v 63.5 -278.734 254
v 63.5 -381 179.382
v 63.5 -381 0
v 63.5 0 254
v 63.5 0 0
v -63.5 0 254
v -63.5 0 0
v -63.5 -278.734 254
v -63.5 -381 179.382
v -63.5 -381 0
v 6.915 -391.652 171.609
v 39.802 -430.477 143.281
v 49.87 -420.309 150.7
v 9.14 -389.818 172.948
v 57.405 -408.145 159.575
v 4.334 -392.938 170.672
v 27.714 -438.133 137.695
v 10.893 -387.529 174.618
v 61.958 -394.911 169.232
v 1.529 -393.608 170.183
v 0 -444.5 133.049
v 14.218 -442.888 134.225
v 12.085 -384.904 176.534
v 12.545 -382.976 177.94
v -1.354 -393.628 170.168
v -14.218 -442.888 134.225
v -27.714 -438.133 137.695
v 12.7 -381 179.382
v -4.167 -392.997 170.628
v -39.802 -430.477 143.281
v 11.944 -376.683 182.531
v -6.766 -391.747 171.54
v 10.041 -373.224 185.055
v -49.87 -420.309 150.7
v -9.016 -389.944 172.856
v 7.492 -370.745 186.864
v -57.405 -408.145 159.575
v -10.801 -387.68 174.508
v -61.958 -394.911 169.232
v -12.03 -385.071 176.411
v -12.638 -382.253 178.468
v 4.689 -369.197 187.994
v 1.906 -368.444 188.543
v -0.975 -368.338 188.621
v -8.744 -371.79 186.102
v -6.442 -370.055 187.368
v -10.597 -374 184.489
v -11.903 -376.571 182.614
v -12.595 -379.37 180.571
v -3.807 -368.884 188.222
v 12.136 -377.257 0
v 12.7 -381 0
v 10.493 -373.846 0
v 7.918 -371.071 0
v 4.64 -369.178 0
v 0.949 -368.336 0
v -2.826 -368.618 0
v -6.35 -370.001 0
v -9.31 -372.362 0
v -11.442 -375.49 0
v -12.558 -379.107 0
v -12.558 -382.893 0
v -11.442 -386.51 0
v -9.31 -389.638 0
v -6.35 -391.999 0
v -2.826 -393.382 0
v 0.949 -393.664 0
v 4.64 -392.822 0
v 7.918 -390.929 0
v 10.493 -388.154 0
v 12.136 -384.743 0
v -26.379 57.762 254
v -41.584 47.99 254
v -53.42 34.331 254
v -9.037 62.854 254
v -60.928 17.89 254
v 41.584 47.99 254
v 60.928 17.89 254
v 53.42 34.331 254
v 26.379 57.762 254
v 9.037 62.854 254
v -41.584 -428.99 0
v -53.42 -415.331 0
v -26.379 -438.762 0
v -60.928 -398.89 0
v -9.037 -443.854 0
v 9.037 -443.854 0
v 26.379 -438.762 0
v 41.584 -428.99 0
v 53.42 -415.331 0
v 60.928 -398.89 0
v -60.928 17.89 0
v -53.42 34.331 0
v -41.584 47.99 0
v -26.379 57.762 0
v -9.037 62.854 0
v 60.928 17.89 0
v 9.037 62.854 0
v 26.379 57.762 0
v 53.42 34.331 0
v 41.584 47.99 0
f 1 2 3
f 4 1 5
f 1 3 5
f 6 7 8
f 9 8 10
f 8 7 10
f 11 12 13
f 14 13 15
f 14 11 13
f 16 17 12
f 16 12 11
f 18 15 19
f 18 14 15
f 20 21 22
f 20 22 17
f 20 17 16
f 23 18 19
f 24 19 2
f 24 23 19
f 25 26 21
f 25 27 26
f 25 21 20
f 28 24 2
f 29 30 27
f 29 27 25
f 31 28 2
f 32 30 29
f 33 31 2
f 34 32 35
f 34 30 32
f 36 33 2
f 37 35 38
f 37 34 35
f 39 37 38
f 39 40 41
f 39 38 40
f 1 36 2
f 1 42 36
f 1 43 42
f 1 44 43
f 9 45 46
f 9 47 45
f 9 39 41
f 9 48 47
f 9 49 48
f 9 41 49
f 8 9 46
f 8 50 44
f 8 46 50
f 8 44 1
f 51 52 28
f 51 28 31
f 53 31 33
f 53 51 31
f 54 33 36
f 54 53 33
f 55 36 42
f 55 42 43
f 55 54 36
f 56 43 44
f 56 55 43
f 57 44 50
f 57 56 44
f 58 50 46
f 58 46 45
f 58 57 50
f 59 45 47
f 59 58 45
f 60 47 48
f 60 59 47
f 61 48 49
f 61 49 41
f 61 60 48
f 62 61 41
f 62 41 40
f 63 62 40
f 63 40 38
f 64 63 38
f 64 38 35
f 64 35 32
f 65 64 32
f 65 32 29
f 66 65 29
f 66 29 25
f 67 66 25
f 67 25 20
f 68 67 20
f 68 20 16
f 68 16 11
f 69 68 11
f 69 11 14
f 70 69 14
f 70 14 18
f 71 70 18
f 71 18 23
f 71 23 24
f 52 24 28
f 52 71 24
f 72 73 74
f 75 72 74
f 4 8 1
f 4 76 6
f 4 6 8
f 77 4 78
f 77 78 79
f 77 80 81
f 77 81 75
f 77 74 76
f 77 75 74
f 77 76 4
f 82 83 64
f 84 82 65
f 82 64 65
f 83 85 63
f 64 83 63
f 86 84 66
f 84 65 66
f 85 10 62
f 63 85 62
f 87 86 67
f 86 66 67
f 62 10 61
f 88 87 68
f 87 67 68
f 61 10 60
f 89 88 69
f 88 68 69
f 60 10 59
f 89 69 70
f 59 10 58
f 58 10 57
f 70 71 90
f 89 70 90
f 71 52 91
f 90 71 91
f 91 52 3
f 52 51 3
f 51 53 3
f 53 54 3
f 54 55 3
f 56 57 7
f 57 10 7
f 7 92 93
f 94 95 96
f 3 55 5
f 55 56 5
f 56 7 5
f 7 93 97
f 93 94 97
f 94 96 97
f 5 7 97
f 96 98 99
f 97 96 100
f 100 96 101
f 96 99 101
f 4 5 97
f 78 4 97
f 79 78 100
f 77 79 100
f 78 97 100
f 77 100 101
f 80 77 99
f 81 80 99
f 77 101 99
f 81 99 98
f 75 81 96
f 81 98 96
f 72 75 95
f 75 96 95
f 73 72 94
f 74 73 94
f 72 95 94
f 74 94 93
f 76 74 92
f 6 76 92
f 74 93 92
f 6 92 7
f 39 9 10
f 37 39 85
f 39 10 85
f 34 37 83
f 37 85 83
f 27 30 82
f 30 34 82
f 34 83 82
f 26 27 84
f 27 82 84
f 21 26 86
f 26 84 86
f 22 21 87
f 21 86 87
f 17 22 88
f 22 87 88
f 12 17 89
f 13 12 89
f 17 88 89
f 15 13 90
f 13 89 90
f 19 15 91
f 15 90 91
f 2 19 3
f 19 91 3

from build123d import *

# Parameters (mm, degrees)
F1_DEPTH      = 254
F3_DEPTH      = 254
F3_DEPTH_BACK = 254
F4_R          = 12.7
F5_DEPTH      = 254


with BuildPart() as f1:
    # F0 (on Top) → F1 (new body)
    with BuildSketch(Plane.XY):
        with BuildLine():
            Line((-63.5, 0), (63.5, 0))
            ThreePointArc((63.5, 0), (0, 63.5), (-63.5, 0))
        make_face()
        with BuildLine():
            Line((63.5, -381), (63.5, 0))
            ThreePointArc((63.5, 0), (0, -63.5), (-63.5, 0))
            Line((-63.5, 0), (-63.5, -381))
            ThreePointArc((-63.5, -381), (0, -317.5), (63.5, -381))
        make_face()
        with BuildLine():
            ThreePointArc((-63.5, 0), (0, -63.5), (63.5, 0))
            Line((63.5, 0), (-63.5, 0))
        make_face()
        with BuildLine():
            ThreePointArc((-63.5, -381), (0, -444.5), (63.5, -381))
            Line((63.5, -381), (-63.5, -381))
        make_face()
        with BuildLine():
            Line((-63.5, -381), (63.5, -381))
            ThreePointArc((63.5, -381), (0, -317.5), (-63.5, -381))
        make_face()
    extrude(amount=F1_DEPTH)

    # F2 (on Right) → F3 (cut, two sides)
    with BuildSketch(Plane.YZ) as f3_sk:
        Polygon((-487.0654642582, 308.1015944481), (-487.0654642582, 101.9910350442), (-204.5872807503, 308.1015944481), align=None)
    extrude(amount=-F3_DEPTH, mode=Mode.SUBTRACT)
    extrude(f3_sk.sketch, amount=F3_DEPTH_BACK, mode=Mode.SUBTRACT)

    # F4 (on Top) → F5 (cut)
    with BuildSketch(Plane.XY):
        with Locations((0, -381)):
            Circle(F4_R)
    extrude(amount=F5_DEPTH, mode=Mode.SUBTRACT)


solid = f1.part
